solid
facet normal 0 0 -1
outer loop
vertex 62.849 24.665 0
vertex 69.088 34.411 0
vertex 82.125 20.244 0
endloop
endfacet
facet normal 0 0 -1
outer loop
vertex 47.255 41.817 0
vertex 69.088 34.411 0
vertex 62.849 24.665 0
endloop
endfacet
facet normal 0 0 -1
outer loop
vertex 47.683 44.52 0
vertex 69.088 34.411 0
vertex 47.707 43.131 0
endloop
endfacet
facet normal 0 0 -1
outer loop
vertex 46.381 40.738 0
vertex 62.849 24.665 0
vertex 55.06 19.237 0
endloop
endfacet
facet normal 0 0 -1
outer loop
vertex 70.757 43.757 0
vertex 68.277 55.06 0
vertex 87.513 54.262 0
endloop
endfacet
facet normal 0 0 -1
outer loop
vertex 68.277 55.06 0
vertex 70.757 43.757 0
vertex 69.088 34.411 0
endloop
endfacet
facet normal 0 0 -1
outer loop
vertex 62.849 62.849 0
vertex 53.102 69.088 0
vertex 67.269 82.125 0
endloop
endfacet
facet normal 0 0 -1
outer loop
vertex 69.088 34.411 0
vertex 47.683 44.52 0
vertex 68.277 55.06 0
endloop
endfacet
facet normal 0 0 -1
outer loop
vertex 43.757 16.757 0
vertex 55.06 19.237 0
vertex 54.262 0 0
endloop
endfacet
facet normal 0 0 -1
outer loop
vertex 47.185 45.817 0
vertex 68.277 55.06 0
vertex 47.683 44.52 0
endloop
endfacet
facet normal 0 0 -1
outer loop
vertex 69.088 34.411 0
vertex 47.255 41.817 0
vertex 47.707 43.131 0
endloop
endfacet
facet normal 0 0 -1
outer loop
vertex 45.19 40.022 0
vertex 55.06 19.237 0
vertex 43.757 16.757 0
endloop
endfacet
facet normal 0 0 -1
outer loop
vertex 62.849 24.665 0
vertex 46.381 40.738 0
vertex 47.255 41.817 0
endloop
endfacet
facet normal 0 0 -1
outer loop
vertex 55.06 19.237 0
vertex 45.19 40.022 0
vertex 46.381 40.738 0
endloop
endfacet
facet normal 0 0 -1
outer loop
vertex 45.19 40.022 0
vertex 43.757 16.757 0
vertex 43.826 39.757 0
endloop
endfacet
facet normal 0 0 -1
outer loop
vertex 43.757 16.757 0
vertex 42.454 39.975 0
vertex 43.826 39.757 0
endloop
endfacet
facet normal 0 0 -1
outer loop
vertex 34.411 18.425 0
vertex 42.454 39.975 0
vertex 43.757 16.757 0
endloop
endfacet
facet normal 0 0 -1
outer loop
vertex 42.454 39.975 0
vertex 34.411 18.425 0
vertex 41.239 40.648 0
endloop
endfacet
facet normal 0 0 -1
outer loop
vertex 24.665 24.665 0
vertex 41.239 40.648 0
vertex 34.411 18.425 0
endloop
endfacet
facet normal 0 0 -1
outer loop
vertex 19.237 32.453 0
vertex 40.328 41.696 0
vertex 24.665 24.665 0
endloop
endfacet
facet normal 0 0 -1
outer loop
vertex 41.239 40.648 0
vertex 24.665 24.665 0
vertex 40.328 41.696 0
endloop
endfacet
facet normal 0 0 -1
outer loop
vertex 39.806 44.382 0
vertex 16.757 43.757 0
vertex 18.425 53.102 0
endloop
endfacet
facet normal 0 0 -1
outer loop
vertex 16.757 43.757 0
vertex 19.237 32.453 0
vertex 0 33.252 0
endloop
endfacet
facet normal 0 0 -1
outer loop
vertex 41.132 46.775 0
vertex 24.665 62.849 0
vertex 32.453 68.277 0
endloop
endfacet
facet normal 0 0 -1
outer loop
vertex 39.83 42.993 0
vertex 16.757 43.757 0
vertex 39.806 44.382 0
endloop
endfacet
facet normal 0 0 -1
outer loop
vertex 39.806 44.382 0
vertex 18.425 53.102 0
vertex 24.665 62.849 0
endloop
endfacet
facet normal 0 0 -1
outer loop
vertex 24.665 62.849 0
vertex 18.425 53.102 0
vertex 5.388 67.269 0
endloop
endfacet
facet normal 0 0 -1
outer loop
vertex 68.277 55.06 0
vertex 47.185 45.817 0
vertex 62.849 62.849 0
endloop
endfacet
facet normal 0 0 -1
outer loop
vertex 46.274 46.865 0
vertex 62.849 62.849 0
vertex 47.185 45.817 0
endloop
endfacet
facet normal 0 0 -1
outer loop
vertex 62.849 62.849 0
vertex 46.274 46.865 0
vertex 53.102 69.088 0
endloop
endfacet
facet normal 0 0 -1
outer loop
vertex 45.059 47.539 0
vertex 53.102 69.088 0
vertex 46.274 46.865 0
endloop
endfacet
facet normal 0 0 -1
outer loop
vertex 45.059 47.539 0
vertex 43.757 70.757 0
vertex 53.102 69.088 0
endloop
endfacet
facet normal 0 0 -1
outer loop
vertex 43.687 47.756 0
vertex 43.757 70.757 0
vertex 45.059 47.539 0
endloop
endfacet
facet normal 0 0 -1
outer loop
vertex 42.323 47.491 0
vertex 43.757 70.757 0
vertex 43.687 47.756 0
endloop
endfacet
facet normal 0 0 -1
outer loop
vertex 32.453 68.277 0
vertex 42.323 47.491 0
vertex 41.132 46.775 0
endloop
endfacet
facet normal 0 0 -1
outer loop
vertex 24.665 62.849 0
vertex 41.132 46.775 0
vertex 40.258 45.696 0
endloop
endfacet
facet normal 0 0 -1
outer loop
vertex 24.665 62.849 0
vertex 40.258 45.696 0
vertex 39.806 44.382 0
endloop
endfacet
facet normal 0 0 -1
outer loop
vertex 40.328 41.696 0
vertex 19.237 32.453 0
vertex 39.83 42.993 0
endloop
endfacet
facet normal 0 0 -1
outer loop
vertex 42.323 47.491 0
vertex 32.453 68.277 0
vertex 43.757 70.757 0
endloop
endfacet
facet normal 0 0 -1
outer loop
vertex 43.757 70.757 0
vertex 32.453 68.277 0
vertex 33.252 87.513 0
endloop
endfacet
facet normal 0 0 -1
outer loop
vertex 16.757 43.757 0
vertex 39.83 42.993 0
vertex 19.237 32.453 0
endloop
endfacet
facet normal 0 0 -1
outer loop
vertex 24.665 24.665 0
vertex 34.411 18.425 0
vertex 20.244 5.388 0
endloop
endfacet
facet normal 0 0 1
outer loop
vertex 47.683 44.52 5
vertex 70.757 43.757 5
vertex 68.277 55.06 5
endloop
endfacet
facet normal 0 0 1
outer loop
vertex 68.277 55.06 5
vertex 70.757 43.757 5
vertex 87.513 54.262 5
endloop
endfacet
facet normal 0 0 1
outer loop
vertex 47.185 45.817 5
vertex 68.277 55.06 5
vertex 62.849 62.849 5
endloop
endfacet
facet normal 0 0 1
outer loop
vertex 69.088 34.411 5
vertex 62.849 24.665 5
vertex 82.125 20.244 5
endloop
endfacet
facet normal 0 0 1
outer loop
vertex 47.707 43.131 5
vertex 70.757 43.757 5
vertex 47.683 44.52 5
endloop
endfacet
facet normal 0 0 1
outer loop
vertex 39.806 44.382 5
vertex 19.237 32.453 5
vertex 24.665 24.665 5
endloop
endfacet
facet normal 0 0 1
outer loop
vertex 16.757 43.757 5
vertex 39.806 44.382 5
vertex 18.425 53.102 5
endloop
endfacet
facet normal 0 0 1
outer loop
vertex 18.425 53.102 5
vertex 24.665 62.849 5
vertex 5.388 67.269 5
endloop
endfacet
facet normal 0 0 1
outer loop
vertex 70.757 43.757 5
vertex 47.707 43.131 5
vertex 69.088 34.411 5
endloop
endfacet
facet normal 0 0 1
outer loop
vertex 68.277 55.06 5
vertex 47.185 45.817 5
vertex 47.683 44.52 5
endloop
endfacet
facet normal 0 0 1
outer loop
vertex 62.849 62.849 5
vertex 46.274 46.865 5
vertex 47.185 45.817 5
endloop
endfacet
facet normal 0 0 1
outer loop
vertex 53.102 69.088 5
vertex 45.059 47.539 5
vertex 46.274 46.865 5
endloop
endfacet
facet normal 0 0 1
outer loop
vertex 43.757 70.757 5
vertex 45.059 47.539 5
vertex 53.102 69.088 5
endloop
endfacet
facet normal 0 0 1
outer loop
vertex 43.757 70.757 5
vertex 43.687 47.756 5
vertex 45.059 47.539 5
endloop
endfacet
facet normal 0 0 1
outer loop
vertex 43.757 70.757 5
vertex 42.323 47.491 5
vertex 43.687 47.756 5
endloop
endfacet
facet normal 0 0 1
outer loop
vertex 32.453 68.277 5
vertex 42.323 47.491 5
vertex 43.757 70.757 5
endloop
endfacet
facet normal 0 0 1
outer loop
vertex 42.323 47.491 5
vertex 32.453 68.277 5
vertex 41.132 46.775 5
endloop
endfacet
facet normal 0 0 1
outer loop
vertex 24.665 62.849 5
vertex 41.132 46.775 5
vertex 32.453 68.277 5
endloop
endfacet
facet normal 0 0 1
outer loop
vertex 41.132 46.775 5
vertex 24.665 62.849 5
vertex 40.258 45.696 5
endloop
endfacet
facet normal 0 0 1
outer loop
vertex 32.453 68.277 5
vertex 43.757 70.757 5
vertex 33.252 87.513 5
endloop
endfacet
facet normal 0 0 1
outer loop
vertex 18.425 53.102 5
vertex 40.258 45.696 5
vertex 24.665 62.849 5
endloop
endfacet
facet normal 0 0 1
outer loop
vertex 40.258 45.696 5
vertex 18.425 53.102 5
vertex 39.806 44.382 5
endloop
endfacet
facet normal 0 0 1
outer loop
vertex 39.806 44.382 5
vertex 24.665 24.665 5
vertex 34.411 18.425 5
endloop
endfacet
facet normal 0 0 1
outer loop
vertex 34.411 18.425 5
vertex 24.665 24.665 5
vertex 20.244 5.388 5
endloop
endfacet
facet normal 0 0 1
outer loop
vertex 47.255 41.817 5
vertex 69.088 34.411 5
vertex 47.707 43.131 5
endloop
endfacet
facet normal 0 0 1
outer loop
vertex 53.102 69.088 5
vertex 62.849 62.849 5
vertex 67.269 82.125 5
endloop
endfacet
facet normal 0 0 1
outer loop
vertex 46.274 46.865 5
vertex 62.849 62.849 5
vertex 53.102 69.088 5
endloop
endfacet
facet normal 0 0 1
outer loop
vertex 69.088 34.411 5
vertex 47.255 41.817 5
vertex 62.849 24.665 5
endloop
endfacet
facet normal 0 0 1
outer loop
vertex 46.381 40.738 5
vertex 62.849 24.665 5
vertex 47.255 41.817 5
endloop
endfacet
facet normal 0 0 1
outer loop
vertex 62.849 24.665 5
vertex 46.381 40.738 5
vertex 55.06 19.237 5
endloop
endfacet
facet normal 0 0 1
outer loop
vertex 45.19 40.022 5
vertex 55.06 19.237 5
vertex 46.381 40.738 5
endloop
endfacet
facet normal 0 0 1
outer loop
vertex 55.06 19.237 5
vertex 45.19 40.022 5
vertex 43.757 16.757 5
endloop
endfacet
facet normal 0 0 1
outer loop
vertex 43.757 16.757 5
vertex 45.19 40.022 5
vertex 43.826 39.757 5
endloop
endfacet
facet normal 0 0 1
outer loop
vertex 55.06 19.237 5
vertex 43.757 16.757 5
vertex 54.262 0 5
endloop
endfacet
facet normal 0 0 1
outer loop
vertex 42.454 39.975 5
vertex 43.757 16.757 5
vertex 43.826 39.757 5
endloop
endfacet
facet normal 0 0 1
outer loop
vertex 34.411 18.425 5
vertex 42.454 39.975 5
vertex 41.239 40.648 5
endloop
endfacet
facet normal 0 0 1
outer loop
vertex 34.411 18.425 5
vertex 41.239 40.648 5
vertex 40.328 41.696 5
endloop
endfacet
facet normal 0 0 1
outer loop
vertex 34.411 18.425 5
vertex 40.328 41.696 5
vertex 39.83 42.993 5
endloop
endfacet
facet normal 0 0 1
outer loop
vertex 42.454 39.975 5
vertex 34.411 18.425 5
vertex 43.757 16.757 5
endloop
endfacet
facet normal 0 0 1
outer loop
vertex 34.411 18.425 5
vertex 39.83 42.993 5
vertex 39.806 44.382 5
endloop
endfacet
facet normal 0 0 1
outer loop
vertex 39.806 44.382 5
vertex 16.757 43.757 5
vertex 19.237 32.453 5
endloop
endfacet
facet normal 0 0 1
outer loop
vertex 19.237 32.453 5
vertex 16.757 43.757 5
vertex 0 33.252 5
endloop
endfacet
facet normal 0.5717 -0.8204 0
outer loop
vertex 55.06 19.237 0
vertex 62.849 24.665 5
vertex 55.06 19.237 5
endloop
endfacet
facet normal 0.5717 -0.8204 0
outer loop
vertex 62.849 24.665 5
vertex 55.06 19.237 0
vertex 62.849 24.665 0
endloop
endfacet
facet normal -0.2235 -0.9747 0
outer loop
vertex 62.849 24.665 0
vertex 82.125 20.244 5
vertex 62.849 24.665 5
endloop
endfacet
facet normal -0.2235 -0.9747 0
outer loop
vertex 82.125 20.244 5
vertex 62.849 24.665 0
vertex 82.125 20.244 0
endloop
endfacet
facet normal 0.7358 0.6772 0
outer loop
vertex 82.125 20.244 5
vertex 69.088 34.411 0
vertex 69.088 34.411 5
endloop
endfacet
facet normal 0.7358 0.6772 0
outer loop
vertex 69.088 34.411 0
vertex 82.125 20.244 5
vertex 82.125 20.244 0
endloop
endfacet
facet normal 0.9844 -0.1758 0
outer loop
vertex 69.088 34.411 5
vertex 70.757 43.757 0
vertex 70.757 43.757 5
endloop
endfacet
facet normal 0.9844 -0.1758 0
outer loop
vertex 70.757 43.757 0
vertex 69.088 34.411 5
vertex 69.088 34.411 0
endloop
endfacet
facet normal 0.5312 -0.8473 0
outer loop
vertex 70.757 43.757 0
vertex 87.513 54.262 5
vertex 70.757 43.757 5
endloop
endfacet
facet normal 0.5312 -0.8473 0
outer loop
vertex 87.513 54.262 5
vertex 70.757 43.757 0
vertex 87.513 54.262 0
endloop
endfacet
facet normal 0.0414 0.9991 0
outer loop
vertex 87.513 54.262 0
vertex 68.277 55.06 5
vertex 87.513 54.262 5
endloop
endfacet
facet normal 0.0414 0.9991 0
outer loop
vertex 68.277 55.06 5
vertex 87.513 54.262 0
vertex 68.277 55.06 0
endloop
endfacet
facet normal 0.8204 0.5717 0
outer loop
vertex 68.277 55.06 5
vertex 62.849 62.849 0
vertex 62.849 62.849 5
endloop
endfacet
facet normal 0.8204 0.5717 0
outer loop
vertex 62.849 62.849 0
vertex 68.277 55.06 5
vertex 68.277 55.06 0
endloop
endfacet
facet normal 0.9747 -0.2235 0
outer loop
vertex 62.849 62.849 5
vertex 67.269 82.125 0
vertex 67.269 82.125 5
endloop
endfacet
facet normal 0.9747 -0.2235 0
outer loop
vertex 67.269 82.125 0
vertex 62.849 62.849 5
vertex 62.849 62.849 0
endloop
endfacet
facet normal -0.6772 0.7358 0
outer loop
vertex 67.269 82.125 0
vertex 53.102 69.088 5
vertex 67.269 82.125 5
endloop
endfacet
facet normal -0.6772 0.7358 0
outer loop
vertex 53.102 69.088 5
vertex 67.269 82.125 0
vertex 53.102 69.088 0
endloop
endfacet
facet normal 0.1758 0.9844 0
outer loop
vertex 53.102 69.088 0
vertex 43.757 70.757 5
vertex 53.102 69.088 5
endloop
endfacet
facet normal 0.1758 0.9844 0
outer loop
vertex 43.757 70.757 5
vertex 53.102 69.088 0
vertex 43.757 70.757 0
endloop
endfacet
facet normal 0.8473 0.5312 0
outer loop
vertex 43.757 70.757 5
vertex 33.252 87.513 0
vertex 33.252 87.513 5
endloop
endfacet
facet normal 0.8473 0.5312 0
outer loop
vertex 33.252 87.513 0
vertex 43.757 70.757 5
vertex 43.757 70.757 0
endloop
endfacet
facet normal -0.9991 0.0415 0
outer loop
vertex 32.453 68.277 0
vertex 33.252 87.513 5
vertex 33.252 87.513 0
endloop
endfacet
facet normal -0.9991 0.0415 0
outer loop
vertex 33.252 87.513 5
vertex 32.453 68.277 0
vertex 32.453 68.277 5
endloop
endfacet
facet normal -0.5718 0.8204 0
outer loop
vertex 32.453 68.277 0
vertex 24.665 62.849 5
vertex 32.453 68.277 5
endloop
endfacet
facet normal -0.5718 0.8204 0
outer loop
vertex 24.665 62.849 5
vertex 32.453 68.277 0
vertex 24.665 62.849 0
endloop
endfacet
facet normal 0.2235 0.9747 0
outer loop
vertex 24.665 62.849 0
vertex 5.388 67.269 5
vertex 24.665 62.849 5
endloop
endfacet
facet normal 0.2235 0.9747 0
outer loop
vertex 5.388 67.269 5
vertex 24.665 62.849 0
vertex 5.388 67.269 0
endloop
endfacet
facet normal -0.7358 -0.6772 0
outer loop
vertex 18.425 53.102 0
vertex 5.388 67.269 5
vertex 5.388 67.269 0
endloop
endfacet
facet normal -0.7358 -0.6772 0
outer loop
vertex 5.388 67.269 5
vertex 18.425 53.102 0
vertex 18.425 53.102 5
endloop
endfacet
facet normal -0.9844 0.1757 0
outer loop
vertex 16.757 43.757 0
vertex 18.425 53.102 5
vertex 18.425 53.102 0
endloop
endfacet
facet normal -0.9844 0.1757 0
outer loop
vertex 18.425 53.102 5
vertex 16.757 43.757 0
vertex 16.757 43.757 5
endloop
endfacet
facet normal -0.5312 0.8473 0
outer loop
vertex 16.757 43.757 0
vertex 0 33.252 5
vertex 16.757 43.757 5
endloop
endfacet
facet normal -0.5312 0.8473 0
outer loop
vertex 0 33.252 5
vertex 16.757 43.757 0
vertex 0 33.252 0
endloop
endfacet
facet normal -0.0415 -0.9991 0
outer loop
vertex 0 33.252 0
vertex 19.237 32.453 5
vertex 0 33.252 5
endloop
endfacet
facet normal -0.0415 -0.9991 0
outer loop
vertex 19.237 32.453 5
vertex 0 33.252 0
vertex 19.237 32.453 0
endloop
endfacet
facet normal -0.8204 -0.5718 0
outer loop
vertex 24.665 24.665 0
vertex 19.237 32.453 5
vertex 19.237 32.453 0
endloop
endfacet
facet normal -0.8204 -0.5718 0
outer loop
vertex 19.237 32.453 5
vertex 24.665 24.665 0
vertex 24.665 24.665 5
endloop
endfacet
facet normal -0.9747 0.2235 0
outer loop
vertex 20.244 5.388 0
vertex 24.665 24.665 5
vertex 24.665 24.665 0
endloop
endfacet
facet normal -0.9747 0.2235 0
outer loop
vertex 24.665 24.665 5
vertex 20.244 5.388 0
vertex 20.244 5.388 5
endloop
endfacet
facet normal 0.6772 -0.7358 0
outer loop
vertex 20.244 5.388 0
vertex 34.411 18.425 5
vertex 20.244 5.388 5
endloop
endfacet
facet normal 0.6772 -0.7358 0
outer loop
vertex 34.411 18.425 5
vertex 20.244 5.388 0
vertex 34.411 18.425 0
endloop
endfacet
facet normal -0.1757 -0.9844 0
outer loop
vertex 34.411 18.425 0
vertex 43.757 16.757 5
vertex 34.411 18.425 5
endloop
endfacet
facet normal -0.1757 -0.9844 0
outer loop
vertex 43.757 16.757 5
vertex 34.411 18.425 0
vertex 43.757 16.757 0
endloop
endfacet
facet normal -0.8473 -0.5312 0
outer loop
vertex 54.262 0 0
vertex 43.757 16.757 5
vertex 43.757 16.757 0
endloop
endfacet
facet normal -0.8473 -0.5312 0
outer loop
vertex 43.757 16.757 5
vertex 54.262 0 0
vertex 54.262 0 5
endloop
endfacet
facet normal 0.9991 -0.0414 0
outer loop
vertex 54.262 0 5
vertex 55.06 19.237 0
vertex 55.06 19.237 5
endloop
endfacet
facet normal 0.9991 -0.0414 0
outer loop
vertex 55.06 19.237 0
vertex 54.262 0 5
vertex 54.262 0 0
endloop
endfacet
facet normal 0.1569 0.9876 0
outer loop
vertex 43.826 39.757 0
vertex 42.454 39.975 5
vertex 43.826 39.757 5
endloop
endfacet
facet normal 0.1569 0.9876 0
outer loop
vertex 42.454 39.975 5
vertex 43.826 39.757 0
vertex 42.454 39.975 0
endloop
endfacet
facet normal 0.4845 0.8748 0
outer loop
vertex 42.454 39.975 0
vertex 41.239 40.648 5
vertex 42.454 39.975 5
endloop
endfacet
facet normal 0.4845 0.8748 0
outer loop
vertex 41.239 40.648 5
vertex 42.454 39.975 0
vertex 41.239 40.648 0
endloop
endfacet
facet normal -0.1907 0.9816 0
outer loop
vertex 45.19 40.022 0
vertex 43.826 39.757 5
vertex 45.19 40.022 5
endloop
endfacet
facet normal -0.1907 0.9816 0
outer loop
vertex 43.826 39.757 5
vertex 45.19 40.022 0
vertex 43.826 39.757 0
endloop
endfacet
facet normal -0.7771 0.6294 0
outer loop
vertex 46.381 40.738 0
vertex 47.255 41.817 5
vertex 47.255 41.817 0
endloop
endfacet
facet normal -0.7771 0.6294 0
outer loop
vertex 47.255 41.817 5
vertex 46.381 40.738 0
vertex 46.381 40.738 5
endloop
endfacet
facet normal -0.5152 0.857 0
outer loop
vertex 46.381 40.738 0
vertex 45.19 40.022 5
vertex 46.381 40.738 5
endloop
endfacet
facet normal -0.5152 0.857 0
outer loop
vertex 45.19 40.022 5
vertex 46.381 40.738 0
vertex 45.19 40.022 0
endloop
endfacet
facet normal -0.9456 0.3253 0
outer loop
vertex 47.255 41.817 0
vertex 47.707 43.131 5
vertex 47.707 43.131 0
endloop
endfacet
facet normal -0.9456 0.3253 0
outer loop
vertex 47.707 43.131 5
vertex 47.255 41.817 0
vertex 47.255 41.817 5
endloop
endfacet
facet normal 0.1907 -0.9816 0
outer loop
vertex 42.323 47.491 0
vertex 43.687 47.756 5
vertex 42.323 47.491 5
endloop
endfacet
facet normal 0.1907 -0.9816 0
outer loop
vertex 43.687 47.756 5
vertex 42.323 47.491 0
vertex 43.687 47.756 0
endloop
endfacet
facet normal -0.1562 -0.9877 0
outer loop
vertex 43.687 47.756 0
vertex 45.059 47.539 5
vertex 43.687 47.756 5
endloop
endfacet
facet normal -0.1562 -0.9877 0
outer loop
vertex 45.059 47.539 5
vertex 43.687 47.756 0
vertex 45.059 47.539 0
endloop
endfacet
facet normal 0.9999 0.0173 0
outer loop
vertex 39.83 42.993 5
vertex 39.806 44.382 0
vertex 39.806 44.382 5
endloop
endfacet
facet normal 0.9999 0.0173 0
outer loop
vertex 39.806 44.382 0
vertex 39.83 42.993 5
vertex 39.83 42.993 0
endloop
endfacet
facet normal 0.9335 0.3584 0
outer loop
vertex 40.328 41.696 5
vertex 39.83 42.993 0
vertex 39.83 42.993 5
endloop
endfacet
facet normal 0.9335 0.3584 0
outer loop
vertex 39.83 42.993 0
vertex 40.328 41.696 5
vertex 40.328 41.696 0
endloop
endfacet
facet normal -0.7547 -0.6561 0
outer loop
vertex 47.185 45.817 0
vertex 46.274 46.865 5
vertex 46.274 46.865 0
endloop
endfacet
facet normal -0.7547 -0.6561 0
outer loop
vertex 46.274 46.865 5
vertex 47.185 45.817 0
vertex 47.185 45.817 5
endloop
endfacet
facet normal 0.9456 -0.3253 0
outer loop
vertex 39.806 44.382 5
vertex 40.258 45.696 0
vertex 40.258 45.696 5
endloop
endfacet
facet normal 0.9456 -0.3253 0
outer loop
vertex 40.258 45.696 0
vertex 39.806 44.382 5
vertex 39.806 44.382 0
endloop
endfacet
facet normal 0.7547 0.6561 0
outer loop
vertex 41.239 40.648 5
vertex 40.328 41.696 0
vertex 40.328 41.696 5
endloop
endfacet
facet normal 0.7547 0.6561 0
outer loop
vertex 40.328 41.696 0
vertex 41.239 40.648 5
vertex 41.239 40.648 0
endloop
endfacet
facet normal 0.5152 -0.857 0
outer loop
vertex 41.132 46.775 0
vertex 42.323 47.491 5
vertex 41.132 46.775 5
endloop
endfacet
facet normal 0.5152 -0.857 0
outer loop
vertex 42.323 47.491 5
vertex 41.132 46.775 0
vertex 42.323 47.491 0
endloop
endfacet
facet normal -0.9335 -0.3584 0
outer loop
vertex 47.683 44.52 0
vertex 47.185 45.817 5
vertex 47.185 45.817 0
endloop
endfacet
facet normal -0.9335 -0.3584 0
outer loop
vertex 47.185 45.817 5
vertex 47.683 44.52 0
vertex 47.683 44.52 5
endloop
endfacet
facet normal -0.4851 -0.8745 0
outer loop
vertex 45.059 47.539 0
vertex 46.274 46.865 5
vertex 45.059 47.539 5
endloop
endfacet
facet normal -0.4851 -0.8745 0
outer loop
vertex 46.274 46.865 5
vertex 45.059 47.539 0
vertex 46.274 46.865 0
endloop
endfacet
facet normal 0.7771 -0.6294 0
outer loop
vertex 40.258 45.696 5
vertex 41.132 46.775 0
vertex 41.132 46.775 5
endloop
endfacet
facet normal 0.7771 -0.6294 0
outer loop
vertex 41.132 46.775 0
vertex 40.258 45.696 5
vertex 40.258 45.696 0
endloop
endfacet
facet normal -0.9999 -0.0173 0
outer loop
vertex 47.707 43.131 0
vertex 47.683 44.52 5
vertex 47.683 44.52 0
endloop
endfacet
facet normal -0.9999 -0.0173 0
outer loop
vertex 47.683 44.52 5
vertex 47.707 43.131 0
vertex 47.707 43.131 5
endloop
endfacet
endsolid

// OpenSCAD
$fn = 32;

// ----------------------------------------------------------------------
// Star wheel: 8-point ratchet, R45
// ----------------------------------------------------------------------

// --- parameters (mm) ---
n_points = 8;             // number of points / teeth
r_out = 45;               // tip radius
r_in = 27;                // root radius
bore_r = 4;               // centre bore radius
plate_t = 5;              // plate thickness, Z (extrusion height)
bore_d = 8;               // centre bore diameter

profile = [[70.757, 43.757], [87.513, 54.262], [68.277, 55.06], [62.849, 62.849], [67.269, 82.125], [53.102, 69.088], [43.757, 70.757], [33.252, 87.513], [32.453, 68.277], [24.665, 62.849], [5.388, 67.269], [18.425, 53.102], [16.757, 43.757], [0, 33.252], [19.237, 32.453], [24.665, 24.665], [20.244, 5.388], [34.411, 18.425], [43.757, 16.757], [54.262, 0], [55.06, 19.237], [62.849, 24.665], [82.125, 20.244], [69.088, 34.411]];  // primary outline, 24 points, counter clockwise
void_1 = [[47.683, 44.52], [47.185, 45.817], [46.274, 46.865], [45.059, 47.539], [43.687, 47.756], [42.323, 47.491], [41.132, 46.775], [40.258, 45.696], [39.806, 44.382], [39.83, 42.993], [40.328, 41.696], [41.239, 40.648], [42.454, 39.975], [43.826, 39.757], [45.19, 40.022], [46.381, 40.738], [47.255, 41.817], [47.707, 43.131]];  // centre bore, 18 points

// --- the one profile operation ---
difference() {
  linear_extrude(height = plate_t) polygon(points = profile);
  translate([0, 0, -1])
    linear_extrude(height = plate_t + 2) polygon(points = void_1);
}
